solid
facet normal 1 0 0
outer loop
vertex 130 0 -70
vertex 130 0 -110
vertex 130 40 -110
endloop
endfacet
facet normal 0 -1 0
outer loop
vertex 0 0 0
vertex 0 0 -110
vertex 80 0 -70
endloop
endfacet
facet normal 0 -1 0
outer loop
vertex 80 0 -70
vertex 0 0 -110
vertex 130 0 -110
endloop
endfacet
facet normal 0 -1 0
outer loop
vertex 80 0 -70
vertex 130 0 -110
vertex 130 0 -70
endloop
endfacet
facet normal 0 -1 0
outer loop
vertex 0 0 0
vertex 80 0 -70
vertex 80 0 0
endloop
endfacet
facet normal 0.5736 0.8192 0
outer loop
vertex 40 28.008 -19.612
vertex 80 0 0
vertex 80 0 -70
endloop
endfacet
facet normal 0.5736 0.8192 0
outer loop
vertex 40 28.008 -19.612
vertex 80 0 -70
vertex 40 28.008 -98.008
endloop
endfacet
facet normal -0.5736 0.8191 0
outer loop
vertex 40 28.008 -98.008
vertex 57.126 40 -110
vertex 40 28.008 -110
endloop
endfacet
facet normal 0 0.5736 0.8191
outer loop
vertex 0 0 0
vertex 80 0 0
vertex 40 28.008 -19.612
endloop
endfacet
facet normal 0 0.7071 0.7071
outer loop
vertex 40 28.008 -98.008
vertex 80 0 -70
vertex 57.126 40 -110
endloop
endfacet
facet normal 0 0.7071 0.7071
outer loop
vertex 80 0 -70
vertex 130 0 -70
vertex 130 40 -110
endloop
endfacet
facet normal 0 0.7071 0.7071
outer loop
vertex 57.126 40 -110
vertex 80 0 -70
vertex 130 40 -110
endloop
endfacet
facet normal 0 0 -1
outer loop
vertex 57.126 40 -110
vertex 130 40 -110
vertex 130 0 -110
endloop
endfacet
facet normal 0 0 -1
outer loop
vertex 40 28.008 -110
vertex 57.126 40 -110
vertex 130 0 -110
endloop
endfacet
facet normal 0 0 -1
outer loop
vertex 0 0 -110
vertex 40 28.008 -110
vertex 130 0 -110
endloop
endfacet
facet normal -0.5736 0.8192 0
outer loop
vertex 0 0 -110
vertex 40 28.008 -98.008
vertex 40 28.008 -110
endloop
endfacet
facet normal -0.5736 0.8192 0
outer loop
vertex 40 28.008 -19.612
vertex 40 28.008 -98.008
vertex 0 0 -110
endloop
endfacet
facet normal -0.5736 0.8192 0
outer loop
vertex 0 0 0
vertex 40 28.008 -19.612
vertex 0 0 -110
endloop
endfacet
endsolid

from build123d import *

# Parameters (mm, degrees)
EXTRUDE1_DEPTH     = 110
CUT_EXTRUDE1_DEPTH = 81
EXTRUDE2_DEPTH     = 90
SKETCH4_W          = 71.56019469
SKETCH4_H          = 34.192707118
CUT_EXTRUDE2_DEPTH = 10


with BuildPart() as part:
    # Sketch1 → Extrude1 (new body)
    with BuildSketch(Plane.XY):
        Polygon((0, 0), (80, 0), (40, 28.008301528), align=None)
    extrude(amount=-EXTRUDE1_DEPTH)

    # Sketch2 → Cut-Extrude1 (cut, through all)
    with BuildSketch(Plane(origin=(0, 0, 0), x_dir=(0, 0, -1), z_dir=(1, 0, 0))):
        Polygon((0, 0), (19.611623863, 28.008301528), (0, 28.008301528), align=None)
    extrude(amount=CUT_EXTRUDE1_DEPTH, mode=Mode.SUBTRACT)

    # Sketch3 → Extrude2 (add)
    with BuildSketch(Plane(origin=(130, 0, 0), x_dir=(0, 0, -1), z_dir=(1, 0, 0))):
        Polygon((110, 0), (70, 0), (110, 40), align=None)
    extrude(amount=-EXTRUDE2_DEPTH)

    # Sketch4 → Cut-Extrude2 (cut)
    with BuildSketch(Plane(origin=(0, 0, 0), x_dir=(-0.819152044, -0.573576436, 0), z_dir=(-0.573576436, 0.819152044, 0))):
        with Locations((-35.780097345, -92.903646441)):
            Rectangle(SKETCH4_W, SKETCH4_H)
    extrude(amount=CUT_EXTRUDE2_DEPTH, mode=Mode.SUBTRACT)


solid = part.part
